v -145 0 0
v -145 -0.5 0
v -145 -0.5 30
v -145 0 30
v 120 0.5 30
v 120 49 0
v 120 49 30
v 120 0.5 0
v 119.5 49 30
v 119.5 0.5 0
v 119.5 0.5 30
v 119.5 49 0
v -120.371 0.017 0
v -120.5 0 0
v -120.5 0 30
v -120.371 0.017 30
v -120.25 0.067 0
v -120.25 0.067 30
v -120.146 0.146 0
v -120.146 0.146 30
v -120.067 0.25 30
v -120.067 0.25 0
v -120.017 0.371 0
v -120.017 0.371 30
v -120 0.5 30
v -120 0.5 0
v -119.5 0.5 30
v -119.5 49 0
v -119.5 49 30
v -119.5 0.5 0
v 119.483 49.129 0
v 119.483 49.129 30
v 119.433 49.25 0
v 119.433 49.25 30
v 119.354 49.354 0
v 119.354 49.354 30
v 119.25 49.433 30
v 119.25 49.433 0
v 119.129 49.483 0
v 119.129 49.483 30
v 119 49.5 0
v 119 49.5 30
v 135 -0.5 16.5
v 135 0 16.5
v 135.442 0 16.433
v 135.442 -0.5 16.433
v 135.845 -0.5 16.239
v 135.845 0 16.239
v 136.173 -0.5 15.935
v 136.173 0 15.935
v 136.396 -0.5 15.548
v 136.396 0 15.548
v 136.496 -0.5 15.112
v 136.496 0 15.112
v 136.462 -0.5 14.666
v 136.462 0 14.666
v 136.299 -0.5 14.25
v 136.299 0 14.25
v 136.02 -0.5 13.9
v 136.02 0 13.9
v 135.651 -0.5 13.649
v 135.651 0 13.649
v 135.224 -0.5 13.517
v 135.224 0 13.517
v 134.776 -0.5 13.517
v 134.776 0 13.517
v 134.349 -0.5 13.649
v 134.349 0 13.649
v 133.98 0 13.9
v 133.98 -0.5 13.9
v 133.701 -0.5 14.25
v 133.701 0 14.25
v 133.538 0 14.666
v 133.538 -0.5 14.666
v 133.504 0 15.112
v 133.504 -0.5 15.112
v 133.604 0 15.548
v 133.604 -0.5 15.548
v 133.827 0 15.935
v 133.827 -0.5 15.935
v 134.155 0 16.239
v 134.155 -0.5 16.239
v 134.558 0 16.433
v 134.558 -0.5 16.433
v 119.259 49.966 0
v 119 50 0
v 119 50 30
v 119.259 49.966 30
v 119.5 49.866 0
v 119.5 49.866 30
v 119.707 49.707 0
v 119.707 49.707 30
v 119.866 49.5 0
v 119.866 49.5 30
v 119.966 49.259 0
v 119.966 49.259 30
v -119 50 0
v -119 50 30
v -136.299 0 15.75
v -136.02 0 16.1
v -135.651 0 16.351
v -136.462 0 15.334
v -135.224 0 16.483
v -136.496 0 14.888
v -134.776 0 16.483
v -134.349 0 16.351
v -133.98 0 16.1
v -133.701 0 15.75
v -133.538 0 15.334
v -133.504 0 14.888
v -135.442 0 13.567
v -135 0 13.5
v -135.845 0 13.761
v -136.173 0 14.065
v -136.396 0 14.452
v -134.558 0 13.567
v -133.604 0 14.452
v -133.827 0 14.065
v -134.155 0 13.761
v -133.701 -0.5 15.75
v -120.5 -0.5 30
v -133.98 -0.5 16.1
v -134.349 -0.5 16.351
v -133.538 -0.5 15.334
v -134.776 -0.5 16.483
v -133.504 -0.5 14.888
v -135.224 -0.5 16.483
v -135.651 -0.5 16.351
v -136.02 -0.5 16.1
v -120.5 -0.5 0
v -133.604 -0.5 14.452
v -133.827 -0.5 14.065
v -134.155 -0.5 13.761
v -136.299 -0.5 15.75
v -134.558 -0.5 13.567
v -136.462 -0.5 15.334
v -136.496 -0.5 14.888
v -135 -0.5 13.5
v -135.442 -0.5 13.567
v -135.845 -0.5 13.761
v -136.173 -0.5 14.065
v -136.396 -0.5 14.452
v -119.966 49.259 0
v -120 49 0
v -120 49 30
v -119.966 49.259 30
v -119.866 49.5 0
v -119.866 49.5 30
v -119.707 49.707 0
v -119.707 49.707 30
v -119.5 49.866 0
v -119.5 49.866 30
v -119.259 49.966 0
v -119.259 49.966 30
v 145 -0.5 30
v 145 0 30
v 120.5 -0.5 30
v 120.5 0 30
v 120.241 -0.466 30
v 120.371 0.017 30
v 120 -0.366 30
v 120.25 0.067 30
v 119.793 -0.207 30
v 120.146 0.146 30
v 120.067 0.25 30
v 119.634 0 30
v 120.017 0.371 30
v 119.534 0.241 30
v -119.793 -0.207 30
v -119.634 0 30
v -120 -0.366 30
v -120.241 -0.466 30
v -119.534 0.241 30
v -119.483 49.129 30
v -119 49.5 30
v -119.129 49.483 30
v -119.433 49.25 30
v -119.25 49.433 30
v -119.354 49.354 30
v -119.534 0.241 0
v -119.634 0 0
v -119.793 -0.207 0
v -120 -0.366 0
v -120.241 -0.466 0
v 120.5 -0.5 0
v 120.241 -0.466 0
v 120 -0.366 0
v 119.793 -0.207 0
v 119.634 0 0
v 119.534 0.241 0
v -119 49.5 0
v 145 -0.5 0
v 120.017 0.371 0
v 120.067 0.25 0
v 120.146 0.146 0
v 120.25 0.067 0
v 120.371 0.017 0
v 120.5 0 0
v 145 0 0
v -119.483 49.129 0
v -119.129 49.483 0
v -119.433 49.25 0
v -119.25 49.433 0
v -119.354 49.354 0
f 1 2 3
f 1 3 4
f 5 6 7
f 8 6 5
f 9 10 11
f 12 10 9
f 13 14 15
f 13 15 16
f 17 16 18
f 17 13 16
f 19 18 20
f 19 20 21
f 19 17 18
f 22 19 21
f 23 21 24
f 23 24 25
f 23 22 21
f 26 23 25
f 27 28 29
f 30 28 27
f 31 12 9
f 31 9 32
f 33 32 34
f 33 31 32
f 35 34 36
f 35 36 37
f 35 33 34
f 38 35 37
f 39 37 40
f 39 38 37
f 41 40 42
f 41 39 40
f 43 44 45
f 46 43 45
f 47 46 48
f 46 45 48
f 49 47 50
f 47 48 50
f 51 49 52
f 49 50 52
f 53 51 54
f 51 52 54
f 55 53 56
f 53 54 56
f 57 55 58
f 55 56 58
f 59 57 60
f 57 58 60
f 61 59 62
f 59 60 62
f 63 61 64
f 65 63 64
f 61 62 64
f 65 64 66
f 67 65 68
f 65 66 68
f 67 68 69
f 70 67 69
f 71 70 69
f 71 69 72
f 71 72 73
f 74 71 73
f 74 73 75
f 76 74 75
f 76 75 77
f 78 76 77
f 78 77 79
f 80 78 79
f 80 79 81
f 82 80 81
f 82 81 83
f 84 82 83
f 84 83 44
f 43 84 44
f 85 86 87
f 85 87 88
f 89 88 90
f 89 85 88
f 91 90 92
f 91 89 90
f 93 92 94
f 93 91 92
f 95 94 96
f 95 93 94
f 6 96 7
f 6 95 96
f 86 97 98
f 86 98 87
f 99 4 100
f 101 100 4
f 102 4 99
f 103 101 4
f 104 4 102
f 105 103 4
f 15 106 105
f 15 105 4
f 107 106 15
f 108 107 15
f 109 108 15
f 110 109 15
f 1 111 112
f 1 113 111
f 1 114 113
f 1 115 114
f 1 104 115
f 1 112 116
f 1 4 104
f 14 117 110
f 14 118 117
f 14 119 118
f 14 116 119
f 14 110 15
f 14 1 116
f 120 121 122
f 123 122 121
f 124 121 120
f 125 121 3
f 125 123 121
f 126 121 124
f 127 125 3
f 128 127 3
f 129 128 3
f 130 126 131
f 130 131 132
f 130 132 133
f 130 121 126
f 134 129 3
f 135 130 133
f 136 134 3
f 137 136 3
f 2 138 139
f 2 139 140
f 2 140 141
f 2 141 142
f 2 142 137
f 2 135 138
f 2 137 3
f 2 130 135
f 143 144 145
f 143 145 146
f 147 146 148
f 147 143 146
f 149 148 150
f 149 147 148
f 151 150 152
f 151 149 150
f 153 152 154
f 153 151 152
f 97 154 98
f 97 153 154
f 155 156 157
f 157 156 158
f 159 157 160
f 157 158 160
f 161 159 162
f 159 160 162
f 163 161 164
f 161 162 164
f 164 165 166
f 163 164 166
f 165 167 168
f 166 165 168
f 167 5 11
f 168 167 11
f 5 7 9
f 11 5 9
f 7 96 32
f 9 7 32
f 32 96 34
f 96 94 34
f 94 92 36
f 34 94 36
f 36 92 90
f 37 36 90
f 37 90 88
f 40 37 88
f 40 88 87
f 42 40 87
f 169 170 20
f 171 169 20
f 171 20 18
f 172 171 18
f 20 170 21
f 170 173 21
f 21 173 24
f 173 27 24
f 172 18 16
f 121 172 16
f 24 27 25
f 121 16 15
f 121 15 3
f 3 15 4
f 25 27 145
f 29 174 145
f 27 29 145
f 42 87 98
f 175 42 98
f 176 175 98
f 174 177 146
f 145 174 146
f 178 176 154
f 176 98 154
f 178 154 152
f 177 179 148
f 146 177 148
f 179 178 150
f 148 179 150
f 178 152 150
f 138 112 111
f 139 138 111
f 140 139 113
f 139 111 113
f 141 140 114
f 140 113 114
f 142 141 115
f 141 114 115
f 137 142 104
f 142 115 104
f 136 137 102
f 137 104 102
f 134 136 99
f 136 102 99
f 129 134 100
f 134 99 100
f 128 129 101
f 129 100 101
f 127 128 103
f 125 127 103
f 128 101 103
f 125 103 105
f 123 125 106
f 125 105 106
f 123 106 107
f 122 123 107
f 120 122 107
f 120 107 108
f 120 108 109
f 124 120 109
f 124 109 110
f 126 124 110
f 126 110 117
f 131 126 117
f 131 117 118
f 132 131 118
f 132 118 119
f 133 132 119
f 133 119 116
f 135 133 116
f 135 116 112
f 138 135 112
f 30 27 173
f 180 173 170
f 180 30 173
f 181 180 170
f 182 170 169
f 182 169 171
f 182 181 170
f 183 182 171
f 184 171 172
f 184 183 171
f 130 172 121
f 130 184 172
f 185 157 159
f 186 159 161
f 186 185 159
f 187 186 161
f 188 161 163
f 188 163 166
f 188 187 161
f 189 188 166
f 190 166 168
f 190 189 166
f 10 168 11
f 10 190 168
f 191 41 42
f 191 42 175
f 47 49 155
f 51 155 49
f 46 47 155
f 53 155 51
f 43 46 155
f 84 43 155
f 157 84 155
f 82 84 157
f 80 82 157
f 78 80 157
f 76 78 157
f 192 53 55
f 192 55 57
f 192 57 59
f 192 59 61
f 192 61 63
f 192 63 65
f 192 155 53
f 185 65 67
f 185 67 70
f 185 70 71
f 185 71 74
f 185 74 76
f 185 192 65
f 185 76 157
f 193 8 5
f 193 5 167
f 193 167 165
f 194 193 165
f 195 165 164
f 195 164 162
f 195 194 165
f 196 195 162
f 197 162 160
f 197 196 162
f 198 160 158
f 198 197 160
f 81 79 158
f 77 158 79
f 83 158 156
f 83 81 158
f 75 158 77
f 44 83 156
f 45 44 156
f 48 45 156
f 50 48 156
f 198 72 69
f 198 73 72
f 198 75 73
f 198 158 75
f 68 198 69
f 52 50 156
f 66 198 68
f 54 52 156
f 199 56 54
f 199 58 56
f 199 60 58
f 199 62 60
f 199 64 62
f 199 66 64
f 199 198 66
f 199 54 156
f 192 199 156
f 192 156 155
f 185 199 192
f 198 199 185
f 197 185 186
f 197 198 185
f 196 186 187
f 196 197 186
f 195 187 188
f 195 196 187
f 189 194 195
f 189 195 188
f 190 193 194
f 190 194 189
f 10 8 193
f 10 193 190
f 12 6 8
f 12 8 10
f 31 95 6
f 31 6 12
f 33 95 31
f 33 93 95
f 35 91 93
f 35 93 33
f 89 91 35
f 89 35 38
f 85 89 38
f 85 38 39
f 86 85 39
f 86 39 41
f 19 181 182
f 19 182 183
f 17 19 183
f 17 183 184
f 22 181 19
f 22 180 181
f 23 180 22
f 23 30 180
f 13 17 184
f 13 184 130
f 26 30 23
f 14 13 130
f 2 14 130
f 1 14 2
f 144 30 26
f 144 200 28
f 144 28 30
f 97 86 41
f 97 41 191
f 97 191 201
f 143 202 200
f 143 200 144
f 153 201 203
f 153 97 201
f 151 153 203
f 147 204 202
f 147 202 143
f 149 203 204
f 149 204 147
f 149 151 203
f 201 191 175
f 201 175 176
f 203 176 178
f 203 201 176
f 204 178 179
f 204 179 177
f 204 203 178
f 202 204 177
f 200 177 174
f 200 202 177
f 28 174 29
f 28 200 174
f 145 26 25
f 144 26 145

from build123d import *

# Parameters (mm, degrees)
BASE_FLANGE1_DEPTH = 30
SKETCH6_R          = 1.5
CUT_EXTRUDE1_DEPTH = 10


# Sheet-metal steps are written as plain solids
with BuildPart() as part:
    # Sketch1 → Base-Flange1 (new body)
    with BuildSketch(Plane.XY):
        with BuildLine():
            Line((-145, 0), (-120.5, 0))
            ThreePointArc((-120.5, 0), (-120.146446609, 0.146446609), (-120, 0.5))
            Line((-120, 0.5), (-120, 49))
            ThreePointArc((-120, 49), (-119.707106781, 49.707106781), (-119, 50))
            Line((-119, 50), (119, 50))
            ThreePointArc((119, 50), (119.707106781, 49.707106781), (120, 49))
            Line((120, 49), (120, 0.5))
            ThreePointArc((120, 0.5), (120.146446609, 0.146446609), (120.5, 0))
            Line((120.5, 0), (145, 0))
            Line((145, 0), (145, -0.5))
            Line((145, -0.5), (120.5, -0.5))
            ThreePointArc((120.5, -0.5), (119.792893219, -0.207106781), (119.5, 0.5))
            Line((119.5, 0.5), (119.5, 49))
            ThreePointArc((119.5, 49), (119.353553391, 49.353553391), (119, 49.5))
            Line((119, 49.5), (-119, 49.5))
            ThreePointArc((-119, 49.5), (-119.353553391, 49.353553391), (-119.5, 49))
            Line((-119.5, 49), (-119.5, 0.5))
            ThreePointArc((-119.5, 0.5), (-119.792893219, -0.207106781), (-120.5, -0.5))
            Line((-120.5, -0.5), (-145, -0.5))
            Line((-145, -0.5), (-145, 0))
        make_face()
    extrude(amount=BASE_FLANGE1_DEPTH)

    # Sketch6 → Cut-Extrude1 (cut)
    with BuildSketch(Plane(origin=(0, 0, 0), x_dir=(1, 0, 0), z_dir=(0, 1, 0))):
        with Locations(Location((135, -15, 0), (0, 0, 270))):
            Circle(SKETCH6_R)
        with Locations(Location((-135, -15, 0), (0, 0, 90))):
            Circle(SKETCH6_R)
    extrude(amount=-CUT_EXTRUDE1_DEPTH, mode=Mode.SUBTRACT)


solid = part.part
